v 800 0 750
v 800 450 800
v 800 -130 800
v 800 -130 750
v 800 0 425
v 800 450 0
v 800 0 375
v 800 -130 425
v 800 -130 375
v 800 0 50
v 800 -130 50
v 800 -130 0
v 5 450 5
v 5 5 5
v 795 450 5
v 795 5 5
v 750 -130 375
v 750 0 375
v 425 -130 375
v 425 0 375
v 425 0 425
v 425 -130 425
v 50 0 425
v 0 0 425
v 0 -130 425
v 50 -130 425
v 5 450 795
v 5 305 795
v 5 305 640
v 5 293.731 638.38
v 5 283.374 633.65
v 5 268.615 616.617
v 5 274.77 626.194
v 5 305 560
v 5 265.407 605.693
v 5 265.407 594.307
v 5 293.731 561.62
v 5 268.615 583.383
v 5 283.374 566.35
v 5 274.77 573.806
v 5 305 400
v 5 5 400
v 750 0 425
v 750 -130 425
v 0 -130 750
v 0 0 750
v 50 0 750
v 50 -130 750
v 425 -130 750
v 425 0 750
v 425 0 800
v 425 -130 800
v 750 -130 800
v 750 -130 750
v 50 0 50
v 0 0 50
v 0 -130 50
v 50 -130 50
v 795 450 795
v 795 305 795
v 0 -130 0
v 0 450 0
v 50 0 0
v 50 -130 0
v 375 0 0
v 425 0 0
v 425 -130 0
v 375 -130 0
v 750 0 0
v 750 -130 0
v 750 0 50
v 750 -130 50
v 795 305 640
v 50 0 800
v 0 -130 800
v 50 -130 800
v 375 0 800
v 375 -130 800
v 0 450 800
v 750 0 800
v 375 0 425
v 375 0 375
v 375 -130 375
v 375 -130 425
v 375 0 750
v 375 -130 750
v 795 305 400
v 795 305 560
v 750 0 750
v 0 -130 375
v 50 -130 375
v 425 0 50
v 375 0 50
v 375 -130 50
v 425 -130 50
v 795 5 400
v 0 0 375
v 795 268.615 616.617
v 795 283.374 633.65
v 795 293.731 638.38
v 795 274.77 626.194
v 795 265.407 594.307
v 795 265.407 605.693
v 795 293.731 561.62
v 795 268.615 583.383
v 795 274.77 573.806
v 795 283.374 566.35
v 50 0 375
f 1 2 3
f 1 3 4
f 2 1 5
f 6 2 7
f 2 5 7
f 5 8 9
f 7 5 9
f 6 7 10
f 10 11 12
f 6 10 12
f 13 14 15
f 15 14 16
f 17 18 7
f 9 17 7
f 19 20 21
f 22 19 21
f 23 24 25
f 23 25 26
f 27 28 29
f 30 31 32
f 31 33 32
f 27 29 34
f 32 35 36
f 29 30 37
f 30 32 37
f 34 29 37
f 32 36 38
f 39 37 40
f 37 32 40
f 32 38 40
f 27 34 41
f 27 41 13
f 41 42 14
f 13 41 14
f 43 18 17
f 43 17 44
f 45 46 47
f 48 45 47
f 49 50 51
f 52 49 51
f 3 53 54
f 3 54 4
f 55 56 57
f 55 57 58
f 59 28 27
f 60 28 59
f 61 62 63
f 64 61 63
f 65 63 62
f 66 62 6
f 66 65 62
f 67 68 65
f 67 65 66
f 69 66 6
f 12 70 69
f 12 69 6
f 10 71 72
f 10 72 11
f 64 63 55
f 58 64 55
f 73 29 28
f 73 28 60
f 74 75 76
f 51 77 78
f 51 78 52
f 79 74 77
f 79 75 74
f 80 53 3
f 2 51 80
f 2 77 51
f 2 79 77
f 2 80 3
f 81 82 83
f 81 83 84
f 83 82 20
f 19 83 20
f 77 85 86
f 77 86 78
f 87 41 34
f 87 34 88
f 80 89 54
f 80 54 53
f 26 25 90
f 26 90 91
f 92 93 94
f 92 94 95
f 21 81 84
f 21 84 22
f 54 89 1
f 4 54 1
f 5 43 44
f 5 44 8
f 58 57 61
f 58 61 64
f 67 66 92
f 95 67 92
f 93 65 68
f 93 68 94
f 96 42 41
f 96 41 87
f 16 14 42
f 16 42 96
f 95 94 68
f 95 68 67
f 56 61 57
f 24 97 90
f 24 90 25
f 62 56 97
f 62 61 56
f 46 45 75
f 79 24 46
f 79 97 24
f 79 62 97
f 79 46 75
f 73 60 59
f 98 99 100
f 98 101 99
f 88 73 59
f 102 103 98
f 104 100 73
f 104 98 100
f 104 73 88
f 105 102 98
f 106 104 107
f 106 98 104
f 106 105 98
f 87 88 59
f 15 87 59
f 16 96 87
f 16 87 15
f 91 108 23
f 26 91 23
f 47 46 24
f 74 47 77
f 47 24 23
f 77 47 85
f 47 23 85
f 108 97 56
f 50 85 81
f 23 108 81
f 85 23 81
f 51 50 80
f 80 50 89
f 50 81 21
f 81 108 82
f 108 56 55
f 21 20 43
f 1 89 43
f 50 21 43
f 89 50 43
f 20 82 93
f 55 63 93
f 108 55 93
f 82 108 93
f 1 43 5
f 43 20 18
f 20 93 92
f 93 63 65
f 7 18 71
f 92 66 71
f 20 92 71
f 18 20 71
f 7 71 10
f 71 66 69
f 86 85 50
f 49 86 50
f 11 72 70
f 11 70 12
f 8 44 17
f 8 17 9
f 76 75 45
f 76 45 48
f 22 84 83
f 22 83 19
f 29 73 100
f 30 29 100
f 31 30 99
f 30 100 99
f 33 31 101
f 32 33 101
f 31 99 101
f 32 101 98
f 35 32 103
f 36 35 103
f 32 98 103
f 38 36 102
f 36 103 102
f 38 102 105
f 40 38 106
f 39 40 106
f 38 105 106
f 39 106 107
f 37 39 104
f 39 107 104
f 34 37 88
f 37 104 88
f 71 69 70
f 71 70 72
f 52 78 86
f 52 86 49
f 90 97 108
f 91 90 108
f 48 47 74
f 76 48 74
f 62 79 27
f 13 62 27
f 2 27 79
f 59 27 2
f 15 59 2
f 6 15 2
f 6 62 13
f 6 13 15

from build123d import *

# Parameters (mm, degrees)
SKETCH1_W           = 800
SKETCH1_H           = 800
BOSS_EXTRUDE1_DEPTH = 450
SHELL1_T            = -5
SKETCH2_W           = 790
SKETCH2_H           = 395
BOSS_EXTRUDE2_DEPTH = 300
CUT_EXTRUDE1_START  = -5
SKETCH3_R           = 40
CUT_EXTRUDE1_DEPTH  = 790
SKETCH4_W           = 50
SKETCH4_H           = 50
BOSS_EXTRUDE3_DEPTH = 130


with BuildPart() as part:
    # Sketch1 → Boss-Extrude1 (new body)
    with BuildSketch(Plane(origin=(0, 0, 0), x_dir=(1, 0, 0), z_dir=(0, 1, 0))):
        with Locations((400, -400)):
            Rectangle(SKETCH1_W, SKETCH1_H)
    extrude(amount=BOSS_EXTRUDE1_DEPTH)

    # Shell1
    shell1_openings = [part.faces().sort_by_distance(p)[0] for p in [
        (400, 450, 400),
    ]]
    offset(amount=SHELL1_T, openings=shell1_openings, kind=Kind.INTERSECTION)

    # Sketch2 → Boss-Extrude2 (add)
    with BuildSketch(Plane(origin=(0, 5, 0), x_dir=(1, 0, 0), z_dir=(0, 1, 0))):
        with Locations((400, -597.5)):
            Rectangle(SKETCH2_W, SKETCH2_H)
    extrude(amount=BOSS_EXTRUDE2_DEPTH)

    # Sketch3 → Cut-Extrude1 (cut)
    with BuildSketch(Plane(origin=(800, 0, 0), x_dir=(0, 0, -1), z_dir=(1, 0, 0)).offset(CUT_EXTRUDE1_START)):
        with Locations((-600, 305)):
            Circle(SKETCH3_R)
    extrude(amount=-CUT_EXTRUDE1_DEPTH, mode=Mode.SUBTRACT)

    # Sketch4 → Boss-Extrude3 (add)
    with BuildSketch(Plane.XZ):
        with Locations((25, 775)):
            Rectangle(SKETCH4_W, SKETCH4_H)
        with Locations((400, 775)):
            Rectangle(SKETCH4_W, SKETCH4_H)
        with Locations((775, 775)):
            Rectangle(SKETCH4_W, SKETCH4_H)
        with Locations((400, 400)):
            Rectangle(SKETCH4_W, SKETCH4_H)
        with Locations((775, 400)):
            Rectangle(SKETCH4_W, SKETCH4_H)
        with Locations((400, 25)):
            Rectangle(SKETCH4_W, SKETCH4_H)
        with Locations((775, 25)):
            Rectangle(SKETCH4_W, SKETCH4_H)
        with Locations((25, 400)):
            Rectangle(SKETCH4_W, SKETCH4_H)
        with Locations((25, 25)):
            Rectangle(SKETCH4_W, SKETCH4_H)
    extrude(amount=BOSS_EXTRUDE3_DEPTH)


solid = part.part
